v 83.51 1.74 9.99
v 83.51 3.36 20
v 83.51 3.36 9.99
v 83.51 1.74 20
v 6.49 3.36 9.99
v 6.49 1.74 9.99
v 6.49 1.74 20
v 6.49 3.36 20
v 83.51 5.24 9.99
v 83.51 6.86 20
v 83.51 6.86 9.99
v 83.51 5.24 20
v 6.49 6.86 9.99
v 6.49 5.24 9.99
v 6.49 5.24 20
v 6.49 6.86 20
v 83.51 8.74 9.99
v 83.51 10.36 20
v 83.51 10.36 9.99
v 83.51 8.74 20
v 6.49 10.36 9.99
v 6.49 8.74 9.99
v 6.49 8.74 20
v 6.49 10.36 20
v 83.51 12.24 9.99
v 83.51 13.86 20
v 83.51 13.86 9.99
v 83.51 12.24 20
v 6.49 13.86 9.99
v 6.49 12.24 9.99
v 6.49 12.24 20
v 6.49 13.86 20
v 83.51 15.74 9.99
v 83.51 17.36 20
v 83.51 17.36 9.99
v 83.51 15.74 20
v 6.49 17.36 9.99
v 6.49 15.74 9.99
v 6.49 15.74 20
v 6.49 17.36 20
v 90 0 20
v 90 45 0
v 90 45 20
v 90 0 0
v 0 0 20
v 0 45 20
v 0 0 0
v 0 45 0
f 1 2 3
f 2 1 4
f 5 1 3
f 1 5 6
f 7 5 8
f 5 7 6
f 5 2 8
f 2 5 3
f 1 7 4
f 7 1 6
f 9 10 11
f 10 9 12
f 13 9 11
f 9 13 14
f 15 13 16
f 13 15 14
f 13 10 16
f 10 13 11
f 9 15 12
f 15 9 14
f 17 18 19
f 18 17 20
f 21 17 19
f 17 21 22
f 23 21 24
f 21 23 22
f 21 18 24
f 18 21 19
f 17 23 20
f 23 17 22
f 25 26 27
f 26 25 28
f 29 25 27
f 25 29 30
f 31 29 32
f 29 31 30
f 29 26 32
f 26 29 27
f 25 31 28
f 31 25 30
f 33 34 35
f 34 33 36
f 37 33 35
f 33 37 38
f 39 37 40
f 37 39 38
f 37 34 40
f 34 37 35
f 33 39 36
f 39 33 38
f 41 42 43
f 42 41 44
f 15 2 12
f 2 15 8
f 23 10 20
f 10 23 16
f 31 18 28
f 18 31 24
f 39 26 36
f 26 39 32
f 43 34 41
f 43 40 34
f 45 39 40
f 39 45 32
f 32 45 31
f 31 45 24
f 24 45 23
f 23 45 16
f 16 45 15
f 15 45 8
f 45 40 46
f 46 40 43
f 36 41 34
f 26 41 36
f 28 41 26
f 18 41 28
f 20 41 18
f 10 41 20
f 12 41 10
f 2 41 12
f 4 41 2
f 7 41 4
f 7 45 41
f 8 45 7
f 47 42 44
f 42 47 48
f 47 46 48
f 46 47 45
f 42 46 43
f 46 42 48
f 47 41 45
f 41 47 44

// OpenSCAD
// Drying rack for 10 microscope slides
// Slide dimensions: 75 x 25 x 1 mm (L x W x T)
// Base dimensions: 90 x 45 x 20 mm (X x Y x Z)
// Slots: 10 parallel slots, 77 mm long (X), 1.6 mm wide (Y), 10 mm deep (Z)
// Slot spacing: 3.5 mm centre-to-centre in Y
// Slots centred on block in X and Y

// Base dimensions
base_length = 90;   // X
base_width  = 45;   // Y
base_height = 20;   // Z

// Slot dimensions
num_slots   = 10;
slot_length = 77;   // X
slot_width  = 1.6;  // Y
slot_depth  = 10;   // Z
slot_pitch  = 3.5;  // Y spacing between centres

// Calculate slot positions
// Total slot width + gaps: num_slots * slot_width + (num_slots - 1) * (slot_pitch - slot_width)
// But easier: centre the group in Y
// Group width = num_slots * slot_pitch - (slot_pitch - slot_width)
group_width = num_slots * slot_pitch - (slot_pitch - slot_width);
group_half_width = group_width / 2;

// Slot offset from centre in Y
slot_offset_y = (base_width - group_width) / 2;

// Slot offset from front edge in X (slots are 77 mm long, block is 90 mm long)
slot_offset_x = (base_length - slot_length) / 2;

// Base block
module base_block() {
    cube([base_length, base_width, base_height]);
}

// Slot module
module slot(x_offset, y_offset) {
    // Slot extends 0.01 mm past the block in all directions to ensure clean cutting
    translate([x_offset - 0.01, y_offset - 0.01, base_height - slot_depth - 0.01])
        cube([slot_length + 0.02, slot_width + 0.02, slot_depth + 0.02]);
}

// Build the rack
difference() {
    base_block();
    // Generate slots with for loop
    for (i = [0 : num_slots - 1]) {
        // Calculate Y position of each slot centre
        y_pos = -group_half_width + i * slot_pitch + slot_width/2;
        // Translate slot to position
        slot(slot_offset_x, y_pos);
    }
}

// Set resolution for smooth curves
$fn = 64;
